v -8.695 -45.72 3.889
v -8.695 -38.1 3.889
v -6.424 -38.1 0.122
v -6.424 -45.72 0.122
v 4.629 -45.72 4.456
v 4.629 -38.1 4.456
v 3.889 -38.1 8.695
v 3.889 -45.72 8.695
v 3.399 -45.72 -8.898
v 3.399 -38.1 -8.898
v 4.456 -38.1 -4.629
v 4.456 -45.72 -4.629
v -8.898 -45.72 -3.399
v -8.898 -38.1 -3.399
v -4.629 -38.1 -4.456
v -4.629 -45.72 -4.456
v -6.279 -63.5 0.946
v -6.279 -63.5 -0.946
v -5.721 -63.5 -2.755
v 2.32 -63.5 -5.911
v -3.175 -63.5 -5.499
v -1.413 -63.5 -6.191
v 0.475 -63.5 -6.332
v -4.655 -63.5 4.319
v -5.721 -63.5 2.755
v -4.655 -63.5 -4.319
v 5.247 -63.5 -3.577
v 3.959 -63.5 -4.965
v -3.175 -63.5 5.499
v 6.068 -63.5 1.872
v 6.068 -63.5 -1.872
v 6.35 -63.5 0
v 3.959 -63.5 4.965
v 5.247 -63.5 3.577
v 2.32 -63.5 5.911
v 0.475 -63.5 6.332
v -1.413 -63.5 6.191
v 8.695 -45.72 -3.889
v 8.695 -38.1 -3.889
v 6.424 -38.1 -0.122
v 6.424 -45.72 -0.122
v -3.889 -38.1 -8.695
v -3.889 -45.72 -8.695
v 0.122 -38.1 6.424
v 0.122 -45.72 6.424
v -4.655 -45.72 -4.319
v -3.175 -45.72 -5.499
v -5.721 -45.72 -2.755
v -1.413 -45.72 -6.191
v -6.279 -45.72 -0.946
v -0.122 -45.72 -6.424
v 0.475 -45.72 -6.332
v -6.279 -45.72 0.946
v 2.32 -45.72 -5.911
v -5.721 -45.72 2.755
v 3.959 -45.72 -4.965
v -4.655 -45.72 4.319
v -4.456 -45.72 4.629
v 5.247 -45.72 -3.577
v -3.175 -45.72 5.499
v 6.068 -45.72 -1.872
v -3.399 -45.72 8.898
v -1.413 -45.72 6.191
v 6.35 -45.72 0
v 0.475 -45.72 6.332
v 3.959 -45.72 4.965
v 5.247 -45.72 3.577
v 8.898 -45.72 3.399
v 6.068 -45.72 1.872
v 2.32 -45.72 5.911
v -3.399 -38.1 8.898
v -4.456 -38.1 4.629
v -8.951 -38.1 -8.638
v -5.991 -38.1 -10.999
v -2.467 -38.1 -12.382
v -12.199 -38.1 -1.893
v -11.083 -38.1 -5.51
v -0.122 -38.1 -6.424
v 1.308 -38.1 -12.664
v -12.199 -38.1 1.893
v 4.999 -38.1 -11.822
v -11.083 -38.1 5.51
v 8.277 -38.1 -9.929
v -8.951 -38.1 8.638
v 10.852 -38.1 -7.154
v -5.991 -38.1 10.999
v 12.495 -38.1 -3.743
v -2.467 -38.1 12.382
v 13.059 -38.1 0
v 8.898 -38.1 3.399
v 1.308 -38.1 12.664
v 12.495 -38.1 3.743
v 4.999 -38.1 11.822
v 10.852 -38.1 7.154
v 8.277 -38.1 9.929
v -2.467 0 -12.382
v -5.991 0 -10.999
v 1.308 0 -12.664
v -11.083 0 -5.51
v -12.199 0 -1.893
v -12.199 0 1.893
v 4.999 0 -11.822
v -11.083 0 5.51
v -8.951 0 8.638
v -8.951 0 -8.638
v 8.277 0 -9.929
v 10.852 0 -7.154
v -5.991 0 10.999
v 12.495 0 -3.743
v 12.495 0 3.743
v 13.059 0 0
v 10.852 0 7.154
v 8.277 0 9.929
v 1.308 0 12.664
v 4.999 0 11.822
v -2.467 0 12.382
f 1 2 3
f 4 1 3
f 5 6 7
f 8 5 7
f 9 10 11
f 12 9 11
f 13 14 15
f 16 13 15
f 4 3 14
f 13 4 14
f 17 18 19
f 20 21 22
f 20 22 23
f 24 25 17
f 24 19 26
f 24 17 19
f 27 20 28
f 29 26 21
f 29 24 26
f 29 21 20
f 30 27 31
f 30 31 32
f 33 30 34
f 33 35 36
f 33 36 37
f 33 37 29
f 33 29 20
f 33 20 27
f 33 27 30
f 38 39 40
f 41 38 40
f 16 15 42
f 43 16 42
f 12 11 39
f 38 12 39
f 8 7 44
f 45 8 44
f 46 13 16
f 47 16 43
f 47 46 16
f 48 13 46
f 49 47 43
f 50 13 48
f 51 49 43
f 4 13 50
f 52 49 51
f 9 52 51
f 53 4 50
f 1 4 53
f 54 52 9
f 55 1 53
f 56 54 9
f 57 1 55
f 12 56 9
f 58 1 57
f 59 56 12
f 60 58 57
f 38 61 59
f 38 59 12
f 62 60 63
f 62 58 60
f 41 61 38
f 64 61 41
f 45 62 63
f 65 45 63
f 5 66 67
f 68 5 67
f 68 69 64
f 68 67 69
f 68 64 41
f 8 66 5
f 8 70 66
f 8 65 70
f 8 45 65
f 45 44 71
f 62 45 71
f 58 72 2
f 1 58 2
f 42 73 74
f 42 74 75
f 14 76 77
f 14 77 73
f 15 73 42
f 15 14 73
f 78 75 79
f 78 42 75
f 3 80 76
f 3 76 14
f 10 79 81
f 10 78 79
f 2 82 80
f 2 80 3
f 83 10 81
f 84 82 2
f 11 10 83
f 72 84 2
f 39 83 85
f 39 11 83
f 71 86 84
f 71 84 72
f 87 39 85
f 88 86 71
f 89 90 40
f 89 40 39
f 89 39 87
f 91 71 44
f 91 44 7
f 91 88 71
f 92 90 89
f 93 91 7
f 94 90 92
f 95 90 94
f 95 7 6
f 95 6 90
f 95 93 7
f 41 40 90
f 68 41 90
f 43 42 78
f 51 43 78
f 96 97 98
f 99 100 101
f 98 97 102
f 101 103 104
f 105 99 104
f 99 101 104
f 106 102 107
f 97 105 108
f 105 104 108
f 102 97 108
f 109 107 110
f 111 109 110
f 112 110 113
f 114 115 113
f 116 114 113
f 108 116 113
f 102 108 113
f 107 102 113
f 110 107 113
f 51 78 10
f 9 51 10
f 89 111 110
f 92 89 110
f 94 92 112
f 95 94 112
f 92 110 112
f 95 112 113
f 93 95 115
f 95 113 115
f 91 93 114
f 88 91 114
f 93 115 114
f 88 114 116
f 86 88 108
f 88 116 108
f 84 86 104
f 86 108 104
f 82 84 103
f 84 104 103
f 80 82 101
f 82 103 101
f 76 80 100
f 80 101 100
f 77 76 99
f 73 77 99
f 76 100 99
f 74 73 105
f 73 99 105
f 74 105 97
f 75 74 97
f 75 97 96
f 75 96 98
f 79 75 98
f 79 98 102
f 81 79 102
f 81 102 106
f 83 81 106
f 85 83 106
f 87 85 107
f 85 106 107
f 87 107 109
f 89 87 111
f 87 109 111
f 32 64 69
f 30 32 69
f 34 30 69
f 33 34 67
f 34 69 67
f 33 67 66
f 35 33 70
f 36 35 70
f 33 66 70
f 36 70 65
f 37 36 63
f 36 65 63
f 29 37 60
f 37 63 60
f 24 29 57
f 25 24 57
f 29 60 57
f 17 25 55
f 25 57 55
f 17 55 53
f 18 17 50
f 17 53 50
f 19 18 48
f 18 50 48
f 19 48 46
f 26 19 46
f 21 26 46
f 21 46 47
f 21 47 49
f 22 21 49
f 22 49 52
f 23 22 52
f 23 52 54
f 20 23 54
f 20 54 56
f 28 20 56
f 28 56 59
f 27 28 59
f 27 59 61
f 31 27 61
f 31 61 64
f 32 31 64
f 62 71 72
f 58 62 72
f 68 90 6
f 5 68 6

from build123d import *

# Parameters (mm, degrees)
F0_R     = 12.7
F1_DEPTH = 38.1
F2_R     = 6.35
F3_DEPTH = 25.4
F4_R     = 6.35
F5_DEPTH = 7.62


with BuildPart() as f1:
    # F0 (on Front) → F1 (new body)
    with BuildSketch(Plane.XZ):
        with Locations((0.359142, 0)):
            Circle(F0_R)
    extrude(amount=F1_DEPTH)

    # F2 (on face) → F3 (join)
    with BuildSketch(Plane.XZ.offset(38.1)):
        Circle(F2_R)
    extrude(amount=F3_DEPTH)

    # F4 (on face) → F5 (join)
    with BuildSketch(Plane.XZ.offset(38.1)):
        Circle(F4_R)
        Polygon((-4.455793, 4.628796), (-8.695096, 3.888565), (-6.423775, 0.122331), (-8.897992, -3.39873), (-4.628796, -4.455793), (-3.888565, -8.695096), (-0.122331, -6.423775), (3.39873, -8.897992), (4.455793, -4.628796), (8.695096, -3.888565), (6.423775, -0.122331), (8.897992, 3.39873), (4.628796, 4.455793), (3.888565, 8.695096), (0.122331, 6.423775), (-3.39873, 8.897992), align=None)
        Circle(F4_R, mode=Mode.SUBTRACT)
    extrude(amount=F5_DEPTH)


solid = f1.part
